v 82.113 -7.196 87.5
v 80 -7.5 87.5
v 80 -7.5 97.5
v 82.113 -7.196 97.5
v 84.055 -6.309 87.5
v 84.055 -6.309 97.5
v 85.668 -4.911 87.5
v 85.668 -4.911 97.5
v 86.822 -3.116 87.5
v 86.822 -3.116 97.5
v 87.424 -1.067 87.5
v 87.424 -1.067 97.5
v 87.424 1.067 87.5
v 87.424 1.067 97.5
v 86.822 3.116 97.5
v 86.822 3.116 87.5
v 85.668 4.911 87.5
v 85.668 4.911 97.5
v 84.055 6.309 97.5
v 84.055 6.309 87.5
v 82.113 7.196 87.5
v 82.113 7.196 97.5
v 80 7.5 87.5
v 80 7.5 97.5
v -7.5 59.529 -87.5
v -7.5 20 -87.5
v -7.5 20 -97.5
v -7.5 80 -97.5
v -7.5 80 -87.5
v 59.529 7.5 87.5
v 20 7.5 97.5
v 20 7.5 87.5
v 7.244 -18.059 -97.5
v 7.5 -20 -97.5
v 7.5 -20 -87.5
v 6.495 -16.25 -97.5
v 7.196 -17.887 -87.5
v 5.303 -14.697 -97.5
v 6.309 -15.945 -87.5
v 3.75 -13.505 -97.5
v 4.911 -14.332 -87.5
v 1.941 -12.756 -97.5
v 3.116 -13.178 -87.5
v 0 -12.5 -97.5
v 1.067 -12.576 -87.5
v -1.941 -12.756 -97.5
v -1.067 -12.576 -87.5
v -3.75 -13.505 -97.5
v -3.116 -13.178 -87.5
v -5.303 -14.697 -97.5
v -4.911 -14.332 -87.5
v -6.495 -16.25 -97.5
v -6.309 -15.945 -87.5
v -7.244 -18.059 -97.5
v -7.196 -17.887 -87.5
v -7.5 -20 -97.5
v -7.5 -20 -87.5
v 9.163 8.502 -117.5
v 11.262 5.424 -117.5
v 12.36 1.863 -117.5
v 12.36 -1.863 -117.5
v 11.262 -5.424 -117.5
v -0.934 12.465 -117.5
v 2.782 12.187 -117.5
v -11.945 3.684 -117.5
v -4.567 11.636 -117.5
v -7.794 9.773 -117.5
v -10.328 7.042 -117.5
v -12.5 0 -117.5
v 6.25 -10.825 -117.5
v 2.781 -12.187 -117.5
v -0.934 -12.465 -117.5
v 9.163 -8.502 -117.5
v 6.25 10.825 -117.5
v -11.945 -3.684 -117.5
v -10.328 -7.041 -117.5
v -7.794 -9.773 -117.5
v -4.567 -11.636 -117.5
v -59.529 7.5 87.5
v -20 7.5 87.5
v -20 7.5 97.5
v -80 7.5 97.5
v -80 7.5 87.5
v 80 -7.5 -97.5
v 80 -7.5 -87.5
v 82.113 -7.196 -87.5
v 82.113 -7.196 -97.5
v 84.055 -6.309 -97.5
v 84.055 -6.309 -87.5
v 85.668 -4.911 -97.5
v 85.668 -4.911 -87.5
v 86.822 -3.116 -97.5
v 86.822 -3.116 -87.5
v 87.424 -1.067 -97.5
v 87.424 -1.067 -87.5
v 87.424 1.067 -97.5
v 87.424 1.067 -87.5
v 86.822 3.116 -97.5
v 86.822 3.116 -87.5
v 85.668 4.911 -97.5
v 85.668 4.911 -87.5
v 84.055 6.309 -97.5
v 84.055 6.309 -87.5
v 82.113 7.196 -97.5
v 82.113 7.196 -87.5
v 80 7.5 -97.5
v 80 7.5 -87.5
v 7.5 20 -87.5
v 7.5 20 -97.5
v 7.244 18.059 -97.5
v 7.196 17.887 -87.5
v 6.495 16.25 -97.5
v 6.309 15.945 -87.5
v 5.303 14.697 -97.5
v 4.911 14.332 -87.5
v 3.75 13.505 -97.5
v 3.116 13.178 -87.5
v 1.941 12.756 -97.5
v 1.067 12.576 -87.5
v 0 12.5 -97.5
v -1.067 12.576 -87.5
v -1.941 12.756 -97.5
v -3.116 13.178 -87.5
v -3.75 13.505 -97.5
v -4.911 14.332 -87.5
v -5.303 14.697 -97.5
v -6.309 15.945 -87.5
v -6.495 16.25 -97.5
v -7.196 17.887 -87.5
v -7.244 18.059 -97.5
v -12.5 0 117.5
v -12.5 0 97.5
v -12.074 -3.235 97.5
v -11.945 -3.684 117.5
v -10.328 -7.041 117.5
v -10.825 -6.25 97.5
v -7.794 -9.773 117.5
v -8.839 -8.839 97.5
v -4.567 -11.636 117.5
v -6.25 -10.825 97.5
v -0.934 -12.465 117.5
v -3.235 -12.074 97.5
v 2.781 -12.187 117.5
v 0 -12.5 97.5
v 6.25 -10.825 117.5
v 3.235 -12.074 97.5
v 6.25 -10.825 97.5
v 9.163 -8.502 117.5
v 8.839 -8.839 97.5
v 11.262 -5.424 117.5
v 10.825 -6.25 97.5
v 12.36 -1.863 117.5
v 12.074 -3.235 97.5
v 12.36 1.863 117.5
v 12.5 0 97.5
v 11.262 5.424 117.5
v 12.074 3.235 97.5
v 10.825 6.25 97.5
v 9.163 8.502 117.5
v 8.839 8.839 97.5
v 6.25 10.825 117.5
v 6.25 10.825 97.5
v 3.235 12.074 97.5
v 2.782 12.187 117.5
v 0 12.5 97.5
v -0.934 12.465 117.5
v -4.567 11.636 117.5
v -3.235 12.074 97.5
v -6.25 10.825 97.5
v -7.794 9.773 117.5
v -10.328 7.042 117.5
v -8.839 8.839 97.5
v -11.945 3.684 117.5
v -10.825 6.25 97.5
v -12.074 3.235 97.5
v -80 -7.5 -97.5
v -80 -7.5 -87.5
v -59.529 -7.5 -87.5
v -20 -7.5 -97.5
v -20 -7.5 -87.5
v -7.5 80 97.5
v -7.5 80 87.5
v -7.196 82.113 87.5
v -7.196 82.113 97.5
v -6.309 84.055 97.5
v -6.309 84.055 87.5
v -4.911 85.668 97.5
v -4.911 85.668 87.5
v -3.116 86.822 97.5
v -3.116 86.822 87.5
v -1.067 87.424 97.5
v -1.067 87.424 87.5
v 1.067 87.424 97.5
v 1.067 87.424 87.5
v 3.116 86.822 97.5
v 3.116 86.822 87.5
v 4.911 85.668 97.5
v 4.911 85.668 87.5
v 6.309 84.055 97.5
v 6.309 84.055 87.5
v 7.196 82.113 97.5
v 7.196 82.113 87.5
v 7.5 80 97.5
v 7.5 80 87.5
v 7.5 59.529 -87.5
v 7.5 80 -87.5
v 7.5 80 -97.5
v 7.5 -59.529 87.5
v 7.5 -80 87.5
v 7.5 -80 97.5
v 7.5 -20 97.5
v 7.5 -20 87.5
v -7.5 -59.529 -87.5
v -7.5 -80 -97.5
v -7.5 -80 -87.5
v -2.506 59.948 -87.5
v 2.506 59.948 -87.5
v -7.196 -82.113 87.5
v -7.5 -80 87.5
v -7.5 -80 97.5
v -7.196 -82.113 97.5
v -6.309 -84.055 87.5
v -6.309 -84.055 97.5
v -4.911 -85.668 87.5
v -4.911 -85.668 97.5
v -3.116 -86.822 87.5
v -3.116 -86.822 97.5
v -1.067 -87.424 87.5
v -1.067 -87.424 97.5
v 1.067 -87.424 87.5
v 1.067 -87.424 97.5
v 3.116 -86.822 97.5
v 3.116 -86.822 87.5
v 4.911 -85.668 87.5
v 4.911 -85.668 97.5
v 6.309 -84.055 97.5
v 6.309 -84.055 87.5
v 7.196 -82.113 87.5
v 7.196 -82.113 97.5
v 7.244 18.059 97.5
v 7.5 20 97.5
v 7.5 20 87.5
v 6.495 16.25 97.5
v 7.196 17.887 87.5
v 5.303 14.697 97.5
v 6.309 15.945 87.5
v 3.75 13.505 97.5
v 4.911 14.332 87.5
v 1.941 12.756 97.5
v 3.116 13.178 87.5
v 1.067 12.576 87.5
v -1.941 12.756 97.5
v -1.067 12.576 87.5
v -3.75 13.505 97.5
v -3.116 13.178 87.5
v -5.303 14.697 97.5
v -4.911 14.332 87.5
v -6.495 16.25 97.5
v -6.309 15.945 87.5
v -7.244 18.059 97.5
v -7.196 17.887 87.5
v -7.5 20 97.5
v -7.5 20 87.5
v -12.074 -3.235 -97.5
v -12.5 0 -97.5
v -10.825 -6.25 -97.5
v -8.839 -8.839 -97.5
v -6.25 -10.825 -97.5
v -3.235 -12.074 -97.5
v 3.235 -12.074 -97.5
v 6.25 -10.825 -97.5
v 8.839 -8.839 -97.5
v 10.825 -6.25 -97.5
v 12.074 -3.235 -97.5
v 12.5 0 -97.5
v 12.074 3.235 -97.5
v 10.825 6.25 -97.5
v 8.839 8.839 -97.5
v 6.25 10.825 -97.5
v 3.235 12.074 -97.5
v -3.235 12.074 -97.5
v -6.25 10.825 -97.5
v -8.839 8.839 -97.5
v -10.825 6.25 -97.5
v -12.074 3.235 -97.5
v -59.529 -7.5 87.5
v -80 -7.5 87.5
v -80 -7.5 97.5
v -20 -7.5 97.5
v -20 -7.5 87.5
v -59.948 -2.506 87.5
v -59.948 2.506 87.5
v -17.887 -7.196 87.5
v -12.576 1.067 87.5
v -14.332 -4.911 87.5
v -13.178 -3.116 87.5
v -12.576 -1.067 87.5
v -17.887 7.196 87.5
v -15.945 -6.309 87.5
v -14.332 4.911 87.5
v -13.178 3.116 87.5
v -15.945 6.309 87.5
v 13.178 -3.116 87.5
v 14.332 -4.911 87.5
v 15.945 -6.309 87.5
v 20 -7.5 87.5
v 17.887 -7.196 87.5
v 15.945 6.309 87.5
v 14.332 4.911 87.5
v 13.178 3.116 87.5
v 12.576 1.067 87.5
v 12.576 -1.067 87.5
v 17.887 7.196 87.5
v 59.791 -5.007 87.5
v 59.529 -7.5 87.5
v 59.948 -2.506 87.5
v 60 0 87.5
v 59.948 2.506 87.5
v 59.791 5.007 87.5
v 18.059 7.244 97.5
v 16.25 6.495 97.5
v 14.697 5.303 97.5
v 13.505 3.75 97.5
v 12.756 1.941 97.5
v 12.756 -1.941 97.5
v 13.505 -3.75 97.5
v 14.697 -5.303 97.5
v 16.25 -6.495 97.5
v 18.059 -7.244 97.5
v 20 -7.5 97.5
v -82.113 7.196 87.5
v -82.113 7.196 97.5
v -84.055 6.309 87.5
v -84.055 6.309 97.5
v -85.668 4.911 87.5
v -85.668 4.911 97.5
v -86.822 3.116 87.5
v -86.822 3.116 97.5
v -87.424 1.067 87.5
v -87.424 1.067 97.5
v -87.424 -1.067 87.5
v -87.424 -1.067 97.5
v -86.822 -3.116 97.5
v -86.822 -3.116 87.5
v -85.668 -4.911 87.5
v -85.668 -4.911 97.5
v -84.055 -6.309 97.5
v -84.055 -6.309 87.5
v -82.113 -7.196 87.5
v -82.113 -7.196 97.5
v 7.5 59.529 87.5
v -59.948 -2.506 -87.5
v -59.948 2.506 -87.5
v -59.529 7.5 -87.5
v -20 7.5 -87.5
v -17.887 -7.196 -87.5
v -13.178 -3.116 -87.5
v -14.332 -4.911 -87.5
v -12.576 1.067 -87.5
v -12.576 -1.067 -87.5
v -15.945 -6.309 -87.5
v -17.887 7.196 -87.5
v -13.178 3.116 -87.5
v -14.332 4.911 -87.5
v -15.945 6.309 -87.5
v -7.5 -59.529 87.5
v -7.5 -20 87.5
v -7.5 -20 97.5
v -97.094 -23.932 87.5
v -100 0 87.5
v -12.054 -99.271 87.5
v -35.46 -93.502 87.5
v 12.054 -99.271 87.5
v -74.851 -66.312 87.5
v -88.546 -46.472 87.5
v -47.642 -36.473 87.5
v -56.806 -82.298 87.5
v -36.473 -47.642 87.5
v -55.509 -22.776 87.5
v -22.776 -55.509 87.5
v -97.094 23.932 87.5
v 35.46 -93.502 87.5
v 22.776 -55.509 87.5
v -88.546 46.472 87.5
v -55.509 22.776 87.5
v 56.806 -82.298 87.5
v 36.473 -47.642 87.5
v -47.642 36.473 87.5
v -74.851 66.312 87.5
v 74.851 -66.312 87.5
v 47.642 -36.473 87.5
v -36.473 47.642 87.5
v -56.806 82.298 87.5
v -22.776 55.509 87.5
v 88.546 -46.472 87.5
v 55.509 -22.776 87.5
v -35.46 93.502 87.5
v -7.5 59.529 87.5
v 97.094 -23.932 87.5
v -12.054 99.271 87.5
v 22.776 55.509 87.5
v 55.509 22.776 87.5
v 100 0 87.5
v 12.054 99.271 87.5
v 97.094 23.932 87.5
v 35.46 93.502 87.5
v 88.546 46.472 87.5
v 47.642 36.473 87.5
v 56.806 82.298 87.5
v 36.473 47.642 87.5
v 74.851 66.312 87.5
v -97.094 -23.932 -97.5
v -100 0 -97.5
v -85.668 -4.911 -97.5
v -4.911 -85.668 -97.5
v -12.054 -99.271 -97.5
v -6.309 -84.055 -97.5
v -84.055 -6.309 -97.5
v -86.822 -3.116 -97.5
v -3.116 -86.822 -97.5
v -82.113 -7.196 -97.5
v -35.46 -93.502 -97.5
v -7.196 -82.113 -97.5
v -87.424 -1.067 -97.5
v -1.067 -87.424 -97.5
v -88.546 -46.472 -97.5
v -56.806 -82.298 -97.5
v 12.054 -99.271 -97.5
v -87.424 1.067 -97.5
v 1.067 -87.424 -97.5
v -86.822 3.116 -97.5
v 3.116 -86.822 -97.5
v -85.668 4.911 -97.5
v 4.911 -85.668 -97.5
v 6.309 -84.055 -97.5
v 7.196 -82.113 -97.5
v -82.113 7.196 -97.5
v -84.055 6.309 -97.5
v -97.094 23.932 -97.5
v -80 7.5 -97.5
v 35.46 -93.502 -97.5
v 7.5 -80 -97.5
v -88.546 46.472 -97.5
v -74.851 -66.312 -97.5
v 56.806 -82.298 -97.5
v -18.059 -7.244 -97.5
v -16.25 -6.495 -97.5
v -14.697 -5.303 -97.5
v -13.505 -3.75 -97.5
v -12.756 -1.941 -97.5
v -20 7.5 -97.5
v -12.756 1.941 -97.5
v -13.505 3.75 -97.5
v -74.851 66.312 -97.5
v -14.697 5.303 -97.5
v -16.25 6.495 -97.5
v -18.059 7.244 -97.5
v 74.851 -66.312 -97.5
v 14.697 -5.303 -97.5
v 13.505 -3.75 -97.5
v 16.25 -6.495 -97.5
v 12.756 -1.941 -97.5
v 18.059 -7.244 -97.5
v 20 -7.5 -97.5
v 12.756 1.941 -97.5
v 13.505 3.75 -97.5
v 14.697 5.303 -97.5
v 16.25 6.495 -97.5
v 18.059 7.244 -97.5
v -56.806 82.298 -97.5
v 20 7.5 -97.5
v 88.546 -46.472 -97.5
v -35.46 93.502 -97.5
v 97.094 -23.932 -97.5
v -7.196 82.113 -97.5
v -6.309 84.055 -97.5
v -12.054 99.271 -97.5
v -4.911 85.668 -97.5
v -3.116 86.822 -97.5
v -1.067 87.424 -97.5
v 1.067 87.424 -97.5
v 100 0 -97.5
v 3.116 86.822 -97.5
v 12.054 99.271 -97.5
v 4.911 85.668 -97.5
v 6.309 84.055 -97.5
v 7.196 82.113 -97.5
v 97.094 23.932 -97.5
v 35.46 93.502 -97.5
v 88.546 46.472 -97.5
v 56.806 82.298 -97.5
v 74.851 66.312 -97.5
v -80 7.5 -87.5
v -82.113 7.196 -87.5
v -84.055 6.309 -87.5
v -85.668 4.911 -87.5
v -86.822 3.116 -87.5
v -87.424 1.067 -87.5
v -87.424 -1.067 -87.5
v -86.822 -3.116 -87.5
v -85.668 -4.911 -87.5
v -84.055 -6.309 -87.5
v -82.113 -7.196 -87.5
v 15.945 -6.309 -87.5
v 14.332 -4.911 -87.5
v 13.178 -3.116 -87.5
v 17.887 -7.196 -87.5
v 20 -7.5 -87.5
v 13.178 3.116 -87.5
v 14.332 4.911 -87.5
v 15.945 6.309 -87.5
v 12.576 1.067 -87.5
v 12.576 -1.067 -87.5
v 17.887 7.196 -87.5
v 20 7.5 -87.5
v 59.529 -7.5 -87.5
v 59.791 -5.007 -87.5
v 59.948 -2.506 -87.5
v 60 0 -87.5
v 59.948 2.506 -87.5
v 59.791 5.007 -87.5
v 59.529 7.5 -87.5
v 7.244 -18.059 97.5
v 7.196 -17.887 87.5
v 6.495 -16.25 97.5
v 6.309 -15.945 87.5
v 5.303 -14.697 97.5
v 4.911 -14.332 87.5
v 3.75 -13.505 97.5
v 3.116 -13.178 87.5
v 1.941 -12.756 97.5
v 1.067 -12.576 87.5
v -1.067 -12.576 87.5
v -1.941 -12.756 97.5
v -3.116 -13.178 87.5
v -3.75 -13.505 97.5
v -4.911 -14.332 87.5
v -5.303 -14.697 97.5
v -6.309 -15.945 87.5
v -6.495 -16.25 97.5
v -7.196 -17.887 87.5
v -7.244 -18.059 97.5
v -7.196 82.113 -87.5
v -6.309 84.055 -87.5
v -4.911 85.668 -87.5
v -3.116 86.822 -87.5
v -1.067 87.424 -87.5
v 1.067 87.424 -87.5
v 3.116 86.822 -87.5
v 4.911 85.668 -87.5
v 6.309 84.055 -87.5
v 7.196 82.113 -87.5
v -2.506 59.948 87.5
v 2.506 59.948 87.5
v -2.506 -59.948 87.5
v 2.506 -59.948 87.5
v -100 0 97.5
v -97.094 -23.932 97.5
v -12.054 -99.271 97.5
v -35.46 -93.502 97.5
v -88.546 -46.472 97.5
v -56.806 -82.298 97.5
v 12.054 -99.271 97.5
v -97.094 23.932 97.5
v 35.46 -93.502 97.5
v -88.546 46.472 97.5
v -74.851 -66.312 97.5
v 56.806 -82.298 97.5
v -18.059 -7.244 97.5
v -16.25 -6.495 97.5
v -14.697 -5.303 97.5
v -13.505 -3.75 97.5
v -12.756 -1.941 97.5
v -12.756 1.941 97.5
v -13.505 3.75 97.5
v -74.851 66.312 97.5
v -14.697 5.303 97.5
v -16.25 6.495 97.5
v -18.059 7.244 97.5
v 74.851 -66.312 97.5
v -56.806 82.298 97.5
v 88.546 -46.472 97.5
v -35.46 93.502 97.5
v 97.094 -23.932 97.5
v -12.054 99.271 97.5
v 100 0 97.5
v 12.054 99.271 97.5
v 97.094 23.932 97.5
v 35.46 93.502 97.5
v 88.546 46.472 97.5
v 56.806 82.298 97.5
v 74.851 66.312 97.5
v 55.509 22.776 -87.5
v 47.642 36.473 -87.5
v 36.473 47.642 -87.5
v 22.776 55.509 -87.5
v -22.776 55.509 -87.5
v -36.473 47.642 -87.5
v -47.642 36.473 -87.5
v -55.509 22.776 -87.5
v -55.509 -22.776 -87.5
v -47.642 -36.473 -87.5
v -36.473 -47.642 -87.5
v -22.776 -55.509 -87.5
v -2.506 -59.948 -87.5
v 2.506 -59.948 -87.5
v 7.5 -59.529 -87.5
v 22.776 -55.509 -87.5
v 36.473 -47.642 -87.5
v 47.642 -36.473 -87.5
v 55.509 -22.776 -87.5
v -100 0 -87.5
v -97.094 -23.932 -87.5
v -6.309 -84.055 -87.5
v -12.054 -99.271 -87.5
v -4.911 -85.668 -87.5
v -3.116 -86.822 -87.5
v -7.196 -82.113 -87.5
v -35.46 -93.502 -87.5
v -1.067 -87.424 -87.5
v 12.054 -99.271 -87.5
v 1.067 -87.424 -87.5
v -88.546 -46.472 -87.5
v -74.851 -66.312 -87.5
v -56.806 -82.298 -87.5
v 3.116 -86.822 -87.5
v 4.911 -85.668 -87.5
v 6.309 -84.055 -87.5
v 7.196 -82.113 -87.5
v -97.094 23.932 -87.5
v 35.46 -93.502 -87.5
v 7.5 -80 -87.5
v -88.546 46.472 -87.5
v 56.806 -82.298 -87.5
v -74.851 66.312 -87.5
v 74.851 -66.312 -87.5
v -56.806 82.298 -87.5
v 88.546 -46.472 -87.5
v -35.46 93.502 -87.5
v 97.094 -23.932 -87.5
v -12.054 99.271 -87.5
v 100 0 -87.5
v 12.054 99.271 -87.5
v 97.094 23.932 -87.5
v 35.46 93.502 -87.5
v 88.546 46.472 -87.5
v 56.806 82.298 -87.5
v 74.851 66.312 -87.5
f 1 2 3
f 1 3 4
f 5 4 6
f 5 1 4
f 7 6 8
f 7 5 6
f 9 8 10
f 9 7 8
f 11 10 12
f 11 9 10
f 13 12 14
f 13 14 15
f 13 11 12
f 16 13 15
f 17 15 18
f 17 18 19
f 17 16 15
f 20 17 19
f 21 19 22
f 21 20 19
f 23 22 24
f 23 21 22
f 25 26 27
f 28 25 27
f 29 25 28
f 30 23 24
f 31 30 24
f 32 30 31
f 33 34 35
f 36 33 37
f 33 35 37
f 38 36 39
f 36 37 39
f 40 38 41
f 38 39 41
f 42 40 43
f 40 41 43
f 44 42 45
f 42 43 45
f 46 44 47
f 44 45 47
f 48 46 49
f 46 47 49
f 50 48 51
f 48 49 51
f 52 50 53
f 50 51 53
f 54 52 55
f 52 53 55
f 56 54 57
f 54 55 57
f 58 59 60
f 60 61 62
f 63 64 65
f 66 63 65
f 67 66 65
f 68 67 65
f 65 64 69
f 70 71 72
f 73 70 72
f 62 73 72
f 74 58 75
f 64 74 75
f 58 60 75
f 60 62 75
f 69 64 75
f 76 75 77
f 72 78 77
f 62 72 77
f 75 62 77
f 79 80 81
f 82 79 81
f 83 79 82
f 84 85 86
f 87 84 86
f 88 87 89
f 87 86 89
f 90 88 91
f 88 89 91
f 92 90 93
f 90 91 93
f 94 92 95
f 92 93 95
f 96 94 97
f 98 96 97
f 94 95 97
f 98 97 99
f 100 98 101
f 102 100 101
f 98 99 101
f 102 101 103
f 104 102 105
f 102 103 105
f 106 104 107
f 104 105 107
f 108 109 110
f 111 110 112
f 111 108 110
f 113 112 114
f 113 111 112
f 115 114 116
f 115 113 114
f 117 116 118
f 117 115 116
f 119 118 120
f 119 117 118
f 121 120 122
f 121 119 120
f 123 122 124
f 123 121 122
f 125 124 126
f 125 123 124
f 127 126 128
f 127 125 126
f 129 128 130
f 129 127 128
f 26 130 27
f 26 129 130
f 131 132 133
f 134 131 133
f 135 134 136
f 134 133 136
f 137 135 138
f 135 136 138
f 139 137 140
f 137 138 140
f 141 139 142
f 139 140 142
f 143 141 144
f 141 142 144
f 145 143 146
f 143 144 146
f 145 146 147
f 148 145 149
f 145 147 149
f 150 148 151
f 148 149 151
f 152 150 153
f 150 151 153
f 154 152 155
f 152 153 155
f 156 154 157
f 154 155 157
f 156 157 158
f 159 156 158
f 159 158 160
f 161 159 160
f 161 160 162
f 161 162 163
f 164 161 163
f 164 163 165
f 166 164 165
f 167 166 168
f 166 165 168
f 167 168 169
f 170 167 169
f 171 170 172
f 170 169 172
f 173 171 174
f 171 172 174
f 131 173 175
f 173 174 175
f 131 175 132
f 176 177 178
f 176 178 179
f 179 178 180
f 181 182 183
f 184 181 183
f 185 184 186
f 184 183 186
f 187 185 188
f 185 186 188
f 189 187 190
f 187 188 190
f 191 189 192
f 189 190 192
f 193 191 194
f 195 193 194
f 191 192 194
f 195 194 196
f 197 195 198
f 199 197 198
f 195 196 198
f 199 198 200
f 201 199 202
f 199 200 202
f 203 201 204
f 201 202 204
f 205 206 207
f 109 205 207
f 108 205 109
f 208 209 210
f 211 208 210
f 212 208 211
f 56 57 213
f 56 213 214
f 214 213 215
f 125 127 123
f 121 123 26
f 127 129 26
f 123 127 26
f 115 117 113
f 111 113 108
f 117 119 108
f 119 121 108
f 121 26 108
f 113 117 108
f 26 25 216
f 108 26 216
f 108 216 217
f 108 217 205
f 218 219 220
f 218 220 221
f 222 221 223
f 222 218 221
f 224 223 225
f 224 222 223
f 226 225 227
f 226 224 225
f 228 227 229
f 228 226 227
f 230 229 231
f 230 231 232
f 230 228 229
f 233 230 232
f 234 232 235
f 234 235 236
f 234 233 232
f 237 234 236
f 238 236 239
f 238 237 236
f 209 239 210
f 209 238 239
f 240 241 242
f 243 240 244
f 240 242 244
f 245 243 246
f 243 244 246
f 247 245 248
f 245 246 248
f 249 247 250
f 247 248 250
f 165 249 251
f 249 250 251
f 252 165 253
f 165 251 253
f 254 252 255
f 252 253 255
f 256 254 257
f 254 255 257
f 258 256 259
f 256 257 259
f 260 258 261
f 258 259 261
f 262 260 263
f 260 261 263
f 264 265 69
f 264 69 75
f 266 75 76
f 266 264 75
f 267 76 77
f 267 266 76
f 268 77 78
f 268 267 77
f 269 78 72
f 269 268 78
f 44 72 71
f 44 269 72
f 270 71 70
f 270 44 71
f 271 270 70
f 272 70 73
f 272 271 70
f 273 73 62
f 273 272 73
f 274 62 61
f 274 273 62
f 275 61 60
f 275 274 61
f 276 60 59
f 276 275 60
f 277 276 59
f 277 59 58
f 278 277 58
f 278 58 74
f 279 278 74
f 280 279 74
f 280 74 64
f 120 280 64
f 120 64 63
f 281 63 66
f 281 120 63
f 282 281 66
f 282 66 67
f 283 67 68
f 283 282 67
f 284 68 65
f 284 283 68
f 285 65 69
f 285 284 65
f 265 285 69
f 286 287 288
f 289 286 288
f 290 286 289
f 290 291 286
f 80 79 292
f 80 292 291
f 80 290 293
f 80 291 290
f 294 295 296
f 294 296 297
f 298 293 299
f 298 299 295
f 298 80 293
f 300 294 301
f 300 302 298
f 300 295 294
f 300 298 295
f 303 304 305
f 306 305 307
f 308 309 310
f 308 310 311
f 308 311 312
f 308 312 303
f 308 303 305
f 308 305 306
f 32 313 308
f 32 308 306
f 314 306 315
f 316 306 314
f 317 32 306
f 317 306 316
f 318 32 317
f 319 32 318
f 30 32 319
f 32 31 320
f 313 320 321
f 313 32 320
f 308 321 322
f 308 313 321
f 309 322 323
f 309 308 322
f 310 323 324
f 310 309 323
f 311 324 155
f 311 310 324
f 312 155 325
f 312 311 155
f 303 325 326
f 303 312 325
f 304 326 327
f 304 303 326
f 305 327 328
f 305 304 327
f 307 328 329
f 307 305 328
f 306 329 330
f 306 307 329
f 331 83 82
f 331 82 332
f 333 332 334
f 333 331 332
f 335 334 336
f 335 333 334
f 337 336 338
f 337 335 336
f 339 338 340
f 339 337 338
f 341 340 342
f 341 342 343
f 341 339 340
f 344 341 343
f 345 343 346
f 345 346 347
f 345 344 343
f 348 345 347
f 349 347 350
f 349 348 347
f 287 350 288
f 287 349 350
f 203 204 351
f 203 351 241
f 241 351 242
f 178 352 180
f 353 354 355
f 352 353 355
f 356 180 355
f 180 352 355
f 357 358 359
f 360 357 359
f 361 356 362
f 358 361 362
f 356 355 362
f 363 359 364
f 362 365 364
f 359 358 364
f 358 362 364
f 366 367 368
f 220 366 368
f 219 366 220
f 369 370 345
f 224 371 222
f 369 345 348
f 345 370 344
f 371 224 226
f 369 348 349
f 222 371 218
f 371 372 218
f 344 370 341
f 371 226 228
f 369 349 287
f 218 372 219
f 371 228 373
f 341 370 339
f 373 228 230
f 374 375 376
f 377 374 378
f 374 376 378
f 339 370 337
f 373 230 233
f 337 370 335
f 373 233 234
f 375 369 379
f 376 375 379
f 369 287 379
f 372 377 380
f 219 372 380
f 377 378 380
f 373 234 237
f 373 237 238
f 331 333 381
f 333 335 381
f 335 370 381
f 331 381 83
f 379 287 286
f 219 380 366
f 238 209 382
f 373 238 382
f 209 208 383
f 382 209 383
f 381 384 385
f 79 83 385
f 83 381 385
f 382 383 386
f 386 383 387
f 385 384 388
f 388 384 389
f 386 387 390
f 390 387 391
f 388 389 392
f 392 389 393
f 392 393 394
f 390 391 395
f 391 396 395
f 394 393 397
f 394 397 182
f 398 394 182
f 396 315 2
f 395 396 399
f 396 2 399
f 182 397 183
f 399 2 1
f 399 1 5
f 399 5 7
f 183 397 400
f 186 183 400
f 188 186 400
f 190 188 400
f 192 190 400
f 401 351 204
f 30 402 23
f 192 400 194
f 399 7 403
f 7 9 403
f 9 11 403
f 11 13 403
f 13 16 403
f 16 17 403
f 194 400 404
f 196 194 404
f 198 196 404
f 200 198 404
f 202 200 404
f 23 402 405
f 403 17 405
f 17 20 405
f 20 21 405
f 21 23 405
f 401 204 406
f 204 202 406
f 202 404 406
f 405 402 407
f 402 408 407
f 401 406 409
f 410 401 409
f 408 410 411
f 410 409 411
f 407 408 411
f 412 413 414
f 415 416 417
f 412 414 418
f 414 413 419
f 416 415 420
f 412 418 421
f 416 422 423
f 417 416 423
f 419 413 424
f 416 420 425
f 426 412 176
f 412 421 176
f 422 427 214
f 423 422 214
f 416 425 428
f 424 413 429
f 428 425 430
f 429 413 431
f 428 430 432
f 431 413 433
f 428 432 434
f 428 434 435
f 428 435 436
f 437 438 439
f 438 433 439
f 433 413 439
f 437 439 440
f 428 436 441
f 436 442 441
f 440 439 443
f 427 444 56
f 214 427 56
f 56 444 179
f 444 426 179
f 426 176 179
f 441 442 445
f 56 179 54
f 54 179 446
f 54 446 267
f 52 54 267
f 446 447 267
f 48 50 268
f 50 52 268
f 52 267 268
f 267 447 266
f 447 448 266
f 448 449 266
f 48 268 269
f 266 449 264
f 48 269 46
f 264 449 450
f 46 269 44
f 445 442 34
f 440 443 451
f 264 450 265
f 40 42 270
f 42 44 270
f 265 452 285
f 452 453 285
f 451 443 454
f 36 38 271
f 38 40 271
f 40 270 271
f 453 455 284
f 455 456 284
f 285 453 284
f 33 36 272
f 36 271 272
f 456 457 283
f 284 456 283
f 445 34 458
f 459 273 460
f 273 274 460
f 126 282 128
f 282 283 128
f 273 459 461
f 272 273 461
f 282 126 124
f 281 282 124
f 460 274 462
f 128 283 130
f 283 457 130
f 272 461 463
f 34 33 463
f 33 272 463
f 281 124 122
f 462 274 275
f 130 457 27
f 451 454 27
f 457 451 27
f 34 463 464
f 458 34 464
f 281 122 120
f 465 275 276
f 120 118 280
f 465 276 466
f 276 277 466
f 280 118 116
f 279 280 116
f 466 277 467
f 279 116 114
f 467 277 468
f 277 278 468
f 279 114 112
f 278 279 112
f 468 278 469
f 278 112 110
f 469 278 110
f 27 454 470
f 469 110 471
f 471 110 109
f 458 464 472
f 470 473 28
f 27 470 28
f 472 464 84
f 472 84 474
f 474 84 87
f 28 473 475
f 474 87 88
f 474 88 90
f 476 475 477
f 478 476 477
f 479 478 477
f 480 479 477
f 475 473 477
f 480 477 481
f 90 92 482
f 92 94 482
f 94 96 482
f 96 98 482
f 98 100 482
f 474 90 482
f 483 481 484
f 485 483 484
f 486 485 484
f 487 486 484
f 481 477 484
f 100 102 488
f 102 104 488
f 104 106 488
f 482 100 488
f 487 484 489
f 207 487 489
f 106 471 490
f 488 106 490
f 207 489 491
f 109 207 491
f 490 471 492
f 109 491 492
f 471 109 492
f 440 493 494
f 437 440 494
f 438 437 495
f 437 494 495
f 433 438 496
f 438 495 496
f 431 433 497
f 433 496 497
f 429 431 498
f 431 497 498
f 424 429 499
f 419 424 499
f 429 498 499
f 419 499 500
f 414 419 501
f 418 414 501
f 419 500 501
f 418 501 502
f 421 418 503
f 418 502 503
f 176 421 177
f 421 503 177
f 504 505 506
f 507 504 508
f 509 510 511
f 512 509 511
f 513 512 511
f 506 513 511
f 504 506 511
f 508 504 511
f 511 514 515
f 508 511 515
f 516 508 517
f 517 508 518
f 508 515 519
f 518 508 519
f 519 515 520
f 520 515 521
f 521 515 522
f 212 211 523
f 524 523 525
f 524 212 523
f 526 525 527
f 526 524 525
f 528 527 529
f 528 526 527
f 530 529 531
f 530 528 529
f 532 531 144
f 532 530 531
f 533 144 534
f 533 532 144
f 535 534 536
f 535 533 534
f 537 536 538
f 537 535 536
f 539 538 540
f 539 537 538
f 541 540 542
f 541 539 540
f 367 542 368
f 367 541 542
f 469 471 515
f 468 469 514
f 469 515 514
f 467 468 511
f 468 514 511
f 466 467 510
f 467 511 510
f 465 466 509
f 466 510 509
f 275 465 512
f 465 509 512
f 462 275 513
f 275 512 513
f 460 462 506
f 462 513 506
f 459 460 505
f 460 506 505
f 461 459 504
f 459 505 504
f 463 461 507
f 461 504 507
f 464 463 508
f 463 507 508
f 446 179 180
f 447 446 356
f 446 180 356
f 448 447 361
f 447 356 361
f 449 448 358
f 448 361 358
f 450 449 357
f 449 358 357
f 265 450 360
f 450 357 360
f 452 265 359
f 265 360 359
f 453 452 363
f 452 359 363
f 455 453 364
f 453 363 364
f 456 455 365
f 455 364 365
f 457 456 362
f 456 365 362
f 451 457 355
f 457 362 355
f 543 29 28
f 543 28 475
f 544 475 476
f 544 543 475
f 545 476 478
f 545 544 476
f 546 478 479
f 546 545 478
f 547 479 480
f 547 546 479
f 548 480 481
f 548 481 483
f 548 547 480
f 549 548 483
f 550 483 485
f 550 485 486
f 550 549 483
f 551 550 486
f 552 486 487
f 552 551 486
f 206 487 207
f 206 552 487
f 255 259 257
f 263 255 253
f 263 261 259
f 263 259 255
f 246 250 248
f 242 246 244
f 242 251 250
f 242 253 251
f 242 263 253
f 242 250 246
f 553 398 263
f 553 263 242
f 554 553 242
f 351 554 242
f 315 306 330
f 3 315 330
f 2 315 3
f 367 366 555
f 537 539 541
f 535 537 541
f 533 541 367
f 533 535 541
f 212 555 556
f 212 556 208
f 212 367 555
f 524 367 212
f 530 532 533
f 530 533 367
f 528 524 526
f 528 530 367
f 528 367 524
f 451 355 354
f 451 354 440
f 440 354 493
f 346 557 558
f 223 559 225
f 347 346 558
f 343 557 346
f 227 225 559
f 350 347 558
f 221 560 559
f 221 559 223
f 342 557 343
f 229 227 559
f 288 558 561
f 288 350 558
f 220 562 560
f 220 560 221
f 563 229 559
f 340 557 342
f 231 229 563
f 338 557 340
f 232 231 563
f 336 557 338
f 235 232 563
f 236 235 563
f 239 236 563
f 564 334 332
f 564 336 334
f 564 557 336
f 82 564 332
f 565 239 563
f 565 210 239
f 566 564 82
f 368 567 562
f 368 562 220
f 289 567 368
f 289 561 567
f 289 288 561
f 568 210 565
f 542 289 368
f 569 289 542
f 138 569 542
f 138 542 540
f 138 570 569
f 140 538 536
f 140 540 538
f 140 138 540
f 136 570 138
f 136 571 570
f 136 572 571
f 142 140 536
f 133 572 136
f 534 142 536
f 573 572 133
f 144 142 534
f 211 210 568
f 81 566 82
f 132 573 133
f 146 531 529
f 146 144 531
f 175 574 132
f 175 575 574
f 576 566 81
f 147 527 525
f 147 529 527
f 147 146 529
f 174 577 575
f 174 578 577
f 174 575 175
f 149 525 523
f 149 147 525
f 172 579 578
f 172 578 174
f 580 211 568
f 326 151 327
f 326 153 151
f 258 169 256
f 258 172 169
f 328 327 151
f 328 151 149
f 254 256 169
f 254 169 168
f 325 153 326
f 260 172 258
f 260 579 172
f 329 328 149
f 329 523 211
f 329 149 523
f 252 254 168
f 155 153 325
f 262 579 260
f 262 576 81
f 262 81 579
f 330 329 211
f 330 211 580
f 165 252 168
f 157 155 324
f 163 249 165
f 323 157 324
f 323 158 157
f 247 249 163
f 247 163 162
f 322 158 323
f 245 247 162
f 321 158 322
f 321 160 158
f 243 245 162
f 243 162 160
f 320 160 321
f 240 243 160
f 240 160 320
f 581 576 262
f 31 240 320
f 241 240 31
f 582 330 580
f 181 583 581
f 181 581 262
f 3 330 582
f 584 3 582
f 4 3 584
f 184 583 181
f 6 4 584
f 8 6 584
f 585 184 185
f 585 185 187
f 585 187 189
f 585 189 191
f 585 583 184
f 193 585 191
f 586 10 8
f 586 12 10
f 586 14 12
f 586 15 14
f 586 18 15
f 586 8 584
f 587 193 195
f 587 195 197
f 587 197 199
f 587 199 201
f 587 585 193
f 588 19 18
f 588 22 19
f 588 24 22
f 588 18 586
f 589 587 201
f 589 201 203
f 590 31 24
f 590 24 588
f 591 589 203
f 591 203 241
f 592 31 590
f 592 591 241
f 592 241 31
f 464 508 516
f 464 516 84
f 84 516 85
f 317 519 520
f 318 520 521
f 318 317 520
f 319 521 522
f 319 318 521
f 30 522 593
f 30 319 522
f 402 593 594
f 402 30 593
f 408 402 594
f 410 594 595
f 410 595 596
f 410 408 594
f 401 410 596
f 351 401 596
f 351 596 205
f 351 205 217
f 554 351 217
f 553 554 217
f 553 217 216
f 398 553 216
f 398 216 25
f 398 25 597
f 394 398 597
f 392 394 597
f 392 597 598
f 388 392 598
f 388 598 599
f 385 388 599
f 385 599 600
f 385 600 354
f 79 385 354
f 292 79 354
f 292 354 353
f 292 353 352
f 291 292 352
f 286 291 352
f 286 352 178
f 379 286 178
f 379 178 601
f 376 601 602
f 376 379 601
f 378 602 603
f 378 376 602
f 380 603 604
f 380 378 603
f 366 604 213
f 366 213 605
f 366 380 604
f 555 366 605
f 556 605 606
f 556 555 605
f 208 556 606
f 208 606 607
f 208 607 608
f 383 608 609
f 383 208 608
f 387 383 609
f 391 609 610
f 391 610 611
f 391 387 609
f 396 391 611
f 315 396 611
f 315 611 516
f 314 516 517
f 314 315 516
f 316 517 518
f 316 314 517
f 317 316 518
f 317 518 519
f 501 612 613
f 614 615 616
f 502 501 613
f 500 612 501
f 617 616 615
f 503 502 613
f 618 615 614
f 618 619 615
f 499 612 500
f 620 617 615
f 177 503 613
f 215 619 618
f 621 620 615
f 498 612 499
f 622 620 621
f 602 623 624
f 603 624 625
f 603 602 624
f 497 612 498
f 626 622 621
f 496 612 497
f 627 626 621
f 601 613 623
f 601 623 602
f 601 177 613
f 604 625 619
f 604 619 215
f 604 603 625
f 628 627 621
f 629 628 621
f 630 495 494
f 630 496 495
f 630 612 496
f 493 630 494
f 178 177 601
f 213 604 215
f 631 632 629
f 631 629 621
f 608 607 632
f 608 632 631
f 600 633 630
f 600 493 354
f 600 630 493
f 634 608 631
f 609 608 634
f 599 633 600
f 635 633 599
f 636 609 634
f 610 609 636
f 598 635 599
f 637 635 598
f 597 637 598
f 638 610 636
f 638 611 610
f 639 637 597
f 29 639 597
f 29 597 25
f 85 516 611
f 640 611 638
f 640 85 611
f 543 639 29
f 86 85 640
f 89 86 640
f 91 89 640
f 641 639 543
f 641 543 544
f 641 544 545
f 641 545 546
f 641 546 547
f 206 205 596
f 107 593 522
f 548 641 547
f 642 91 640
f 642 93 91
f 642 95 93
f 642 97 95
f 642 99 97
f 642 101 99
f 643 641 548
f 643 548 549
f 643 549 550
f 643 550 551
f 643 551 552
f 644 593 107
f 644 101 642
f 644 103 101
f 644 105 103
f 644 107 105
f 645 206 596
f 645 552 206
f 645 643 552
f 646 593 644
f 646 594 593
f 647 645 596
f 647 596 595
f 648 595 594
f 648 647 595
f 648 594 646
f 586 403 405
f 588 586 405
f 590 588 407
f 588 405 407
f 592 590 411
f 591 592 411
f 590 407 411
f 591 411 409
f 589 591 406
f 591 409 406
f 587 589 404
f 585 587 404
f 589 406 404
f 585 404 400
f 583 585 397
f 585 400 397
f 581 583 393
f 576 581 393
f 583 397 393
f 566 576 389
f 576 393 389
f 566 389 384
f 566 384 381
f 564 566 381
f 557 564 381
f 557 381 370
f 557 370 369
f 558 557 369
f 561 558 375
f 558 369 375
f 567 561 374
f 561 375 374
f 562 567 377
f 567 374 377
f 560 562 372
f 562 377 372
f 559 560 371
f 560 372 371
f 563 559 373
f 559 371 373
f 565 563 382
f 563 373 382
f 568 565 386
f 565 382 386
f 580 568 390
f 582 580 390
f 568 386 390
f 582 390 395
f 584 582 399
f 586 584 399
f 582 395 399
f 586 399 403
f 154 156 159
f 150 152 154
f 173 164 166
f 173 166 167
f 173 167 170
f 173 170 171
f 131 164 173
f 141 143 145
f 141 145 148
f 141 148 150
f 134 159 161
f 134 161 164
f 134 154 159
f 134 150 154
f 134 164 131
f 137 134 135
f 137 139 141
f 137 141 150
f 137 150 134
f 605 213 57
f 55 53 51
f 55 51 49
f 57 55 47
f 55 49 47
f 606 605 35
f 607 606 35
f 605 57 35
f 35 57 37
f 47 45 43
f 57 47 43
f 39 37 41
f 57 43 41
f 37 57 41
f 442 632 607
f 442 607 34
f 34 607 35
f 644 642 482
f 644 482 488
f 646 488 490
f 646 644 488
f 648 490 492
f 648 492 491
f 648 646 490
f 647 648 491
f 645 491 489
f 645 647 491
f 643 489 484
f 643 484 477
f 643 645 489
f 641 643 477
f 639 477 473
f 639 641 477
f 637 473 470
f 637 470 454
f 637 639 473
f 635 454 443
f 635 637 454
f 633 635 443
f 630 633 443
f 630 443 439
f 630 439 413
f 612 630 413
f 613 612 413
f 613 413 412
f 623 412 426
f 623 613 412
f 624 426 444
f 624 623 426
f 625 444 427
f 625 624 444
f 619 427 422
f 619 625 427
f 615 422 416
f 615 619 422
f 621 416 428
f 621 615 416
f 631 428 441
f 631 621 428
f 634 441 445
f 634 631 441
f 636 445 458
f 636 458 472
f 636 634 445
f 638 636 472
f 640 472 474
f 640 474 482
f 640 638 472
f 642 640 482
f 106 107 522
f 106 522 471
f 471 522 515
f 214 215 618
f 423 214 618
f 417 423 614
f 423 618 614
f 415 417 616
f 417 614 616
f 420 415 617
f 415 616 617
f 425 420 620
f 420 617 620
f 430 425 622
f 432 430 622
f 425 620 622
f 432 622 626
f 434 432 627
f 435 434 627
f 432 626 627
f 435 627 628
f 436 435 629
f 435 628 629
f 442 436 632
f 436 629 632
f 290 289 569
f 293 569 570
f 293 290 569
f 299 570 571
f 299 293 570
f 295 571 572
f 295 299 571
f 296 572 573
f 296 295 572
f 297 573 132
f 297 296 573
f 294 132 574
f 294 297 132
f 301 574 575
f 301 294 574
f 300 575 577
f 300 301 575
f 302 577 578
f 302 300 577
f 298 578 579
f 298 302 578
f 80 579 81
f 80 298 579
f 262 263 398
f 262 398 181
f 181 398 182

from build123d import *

# Parameters (mm, degrees)
SKETCH1_R           = 60
BOSS_EXTRUDE1_DEPTH = 87.5
SKETCH2_R           = 100
BOSS_EXTRUDE2_DEPTH = 10
SKETCH3_R           = 12.5
BOSS_EXTRUDE3_DEPTH = 20


with BuildPart() as part:
    # Sketch1 → Boss-Extrude1 (new, symmetric)
    with BuildSketch(Plane.XY):
        Circle(SKETCH1_R)
    extrude(amount=BOSS_EXTRUDE1_DEPTH, both=True)

    # Sketch2 → Boss-Extrude2 (add)
    with BuildSketch(Plane.XY.offset(87.5)):
        Circle(SKETCH2_R)
        with BuildLine():
            Line((7.5, 80), (7.5, 20))
            ThreePointArc((7.5, 20), (0, 12.5), (-7.5, 20))
            Line((-7.5, 20), (-7.5, 80))
            ThreePointArc((-7.5, 80), (0, 87.5), (7.5, 80))
        make_face(mode=Mode.SUBTRACT)
        with BuildLine():
            Line((80, 7.5), (20, 7.5))
            ThreePointArc((20, 7.5), (12.5, 0), (20, -7.5))
            Line((20, -7.5), (80, -7.5))
            ThreePointArc((80, -7.5), (87.5, 0), (80, 7.5))
        make_face(mode=Mode.SUBTRACT)
        with BuildLine():
            Line((7.5, -80), (7.5, -20))
            ThreePointArc((7.5, -20), (0, -12.5), (-7.5, -20))
            Line((-7.5, -20), (-7.5, -80))
            ThreePointArc((-7.5, -80), (0, -87.5), (7.5, -80))
        make_face(mode=Mode.SUBTRACT)
        with BuildLine():
            Line((-80, -7.5), (-20, -7.5))
            ThreePointArc((-20, -7.5), (-12.5, 0), (-20, 7.5))
            Line((-20, 7.5), (-80, 7.5))
            ThreePointArc((-80, 7.5), (-87.5, 0), (-80, -7.5))
        make_face(mode=Mode.SUBTRACT)
    boss_extrude2 = extrude(amount=BOSS_EXTRUDE2_DEPTH)

    # Sketch3 → Boss-Extrude3 (add)
    with BuildSketch(Plane.XY.offset(97.5)):
        with Locations(Location((0, 0, 0), (0, 0, 179.999859654))):
            Circle(SKETCH3_R)
    boss_extrude3 = extrude(amount=BOSS_EXTRUDE3_DEPTH)

    # Mirror1: Boss-Extrude2 across plane
    add(boss_extrude2.mirror(Plane.XY))

    # Mirror2: Boss-Extrude3 across plane
    add(boss_extrude3.mirror(Plane.XY))


solid = part.part
